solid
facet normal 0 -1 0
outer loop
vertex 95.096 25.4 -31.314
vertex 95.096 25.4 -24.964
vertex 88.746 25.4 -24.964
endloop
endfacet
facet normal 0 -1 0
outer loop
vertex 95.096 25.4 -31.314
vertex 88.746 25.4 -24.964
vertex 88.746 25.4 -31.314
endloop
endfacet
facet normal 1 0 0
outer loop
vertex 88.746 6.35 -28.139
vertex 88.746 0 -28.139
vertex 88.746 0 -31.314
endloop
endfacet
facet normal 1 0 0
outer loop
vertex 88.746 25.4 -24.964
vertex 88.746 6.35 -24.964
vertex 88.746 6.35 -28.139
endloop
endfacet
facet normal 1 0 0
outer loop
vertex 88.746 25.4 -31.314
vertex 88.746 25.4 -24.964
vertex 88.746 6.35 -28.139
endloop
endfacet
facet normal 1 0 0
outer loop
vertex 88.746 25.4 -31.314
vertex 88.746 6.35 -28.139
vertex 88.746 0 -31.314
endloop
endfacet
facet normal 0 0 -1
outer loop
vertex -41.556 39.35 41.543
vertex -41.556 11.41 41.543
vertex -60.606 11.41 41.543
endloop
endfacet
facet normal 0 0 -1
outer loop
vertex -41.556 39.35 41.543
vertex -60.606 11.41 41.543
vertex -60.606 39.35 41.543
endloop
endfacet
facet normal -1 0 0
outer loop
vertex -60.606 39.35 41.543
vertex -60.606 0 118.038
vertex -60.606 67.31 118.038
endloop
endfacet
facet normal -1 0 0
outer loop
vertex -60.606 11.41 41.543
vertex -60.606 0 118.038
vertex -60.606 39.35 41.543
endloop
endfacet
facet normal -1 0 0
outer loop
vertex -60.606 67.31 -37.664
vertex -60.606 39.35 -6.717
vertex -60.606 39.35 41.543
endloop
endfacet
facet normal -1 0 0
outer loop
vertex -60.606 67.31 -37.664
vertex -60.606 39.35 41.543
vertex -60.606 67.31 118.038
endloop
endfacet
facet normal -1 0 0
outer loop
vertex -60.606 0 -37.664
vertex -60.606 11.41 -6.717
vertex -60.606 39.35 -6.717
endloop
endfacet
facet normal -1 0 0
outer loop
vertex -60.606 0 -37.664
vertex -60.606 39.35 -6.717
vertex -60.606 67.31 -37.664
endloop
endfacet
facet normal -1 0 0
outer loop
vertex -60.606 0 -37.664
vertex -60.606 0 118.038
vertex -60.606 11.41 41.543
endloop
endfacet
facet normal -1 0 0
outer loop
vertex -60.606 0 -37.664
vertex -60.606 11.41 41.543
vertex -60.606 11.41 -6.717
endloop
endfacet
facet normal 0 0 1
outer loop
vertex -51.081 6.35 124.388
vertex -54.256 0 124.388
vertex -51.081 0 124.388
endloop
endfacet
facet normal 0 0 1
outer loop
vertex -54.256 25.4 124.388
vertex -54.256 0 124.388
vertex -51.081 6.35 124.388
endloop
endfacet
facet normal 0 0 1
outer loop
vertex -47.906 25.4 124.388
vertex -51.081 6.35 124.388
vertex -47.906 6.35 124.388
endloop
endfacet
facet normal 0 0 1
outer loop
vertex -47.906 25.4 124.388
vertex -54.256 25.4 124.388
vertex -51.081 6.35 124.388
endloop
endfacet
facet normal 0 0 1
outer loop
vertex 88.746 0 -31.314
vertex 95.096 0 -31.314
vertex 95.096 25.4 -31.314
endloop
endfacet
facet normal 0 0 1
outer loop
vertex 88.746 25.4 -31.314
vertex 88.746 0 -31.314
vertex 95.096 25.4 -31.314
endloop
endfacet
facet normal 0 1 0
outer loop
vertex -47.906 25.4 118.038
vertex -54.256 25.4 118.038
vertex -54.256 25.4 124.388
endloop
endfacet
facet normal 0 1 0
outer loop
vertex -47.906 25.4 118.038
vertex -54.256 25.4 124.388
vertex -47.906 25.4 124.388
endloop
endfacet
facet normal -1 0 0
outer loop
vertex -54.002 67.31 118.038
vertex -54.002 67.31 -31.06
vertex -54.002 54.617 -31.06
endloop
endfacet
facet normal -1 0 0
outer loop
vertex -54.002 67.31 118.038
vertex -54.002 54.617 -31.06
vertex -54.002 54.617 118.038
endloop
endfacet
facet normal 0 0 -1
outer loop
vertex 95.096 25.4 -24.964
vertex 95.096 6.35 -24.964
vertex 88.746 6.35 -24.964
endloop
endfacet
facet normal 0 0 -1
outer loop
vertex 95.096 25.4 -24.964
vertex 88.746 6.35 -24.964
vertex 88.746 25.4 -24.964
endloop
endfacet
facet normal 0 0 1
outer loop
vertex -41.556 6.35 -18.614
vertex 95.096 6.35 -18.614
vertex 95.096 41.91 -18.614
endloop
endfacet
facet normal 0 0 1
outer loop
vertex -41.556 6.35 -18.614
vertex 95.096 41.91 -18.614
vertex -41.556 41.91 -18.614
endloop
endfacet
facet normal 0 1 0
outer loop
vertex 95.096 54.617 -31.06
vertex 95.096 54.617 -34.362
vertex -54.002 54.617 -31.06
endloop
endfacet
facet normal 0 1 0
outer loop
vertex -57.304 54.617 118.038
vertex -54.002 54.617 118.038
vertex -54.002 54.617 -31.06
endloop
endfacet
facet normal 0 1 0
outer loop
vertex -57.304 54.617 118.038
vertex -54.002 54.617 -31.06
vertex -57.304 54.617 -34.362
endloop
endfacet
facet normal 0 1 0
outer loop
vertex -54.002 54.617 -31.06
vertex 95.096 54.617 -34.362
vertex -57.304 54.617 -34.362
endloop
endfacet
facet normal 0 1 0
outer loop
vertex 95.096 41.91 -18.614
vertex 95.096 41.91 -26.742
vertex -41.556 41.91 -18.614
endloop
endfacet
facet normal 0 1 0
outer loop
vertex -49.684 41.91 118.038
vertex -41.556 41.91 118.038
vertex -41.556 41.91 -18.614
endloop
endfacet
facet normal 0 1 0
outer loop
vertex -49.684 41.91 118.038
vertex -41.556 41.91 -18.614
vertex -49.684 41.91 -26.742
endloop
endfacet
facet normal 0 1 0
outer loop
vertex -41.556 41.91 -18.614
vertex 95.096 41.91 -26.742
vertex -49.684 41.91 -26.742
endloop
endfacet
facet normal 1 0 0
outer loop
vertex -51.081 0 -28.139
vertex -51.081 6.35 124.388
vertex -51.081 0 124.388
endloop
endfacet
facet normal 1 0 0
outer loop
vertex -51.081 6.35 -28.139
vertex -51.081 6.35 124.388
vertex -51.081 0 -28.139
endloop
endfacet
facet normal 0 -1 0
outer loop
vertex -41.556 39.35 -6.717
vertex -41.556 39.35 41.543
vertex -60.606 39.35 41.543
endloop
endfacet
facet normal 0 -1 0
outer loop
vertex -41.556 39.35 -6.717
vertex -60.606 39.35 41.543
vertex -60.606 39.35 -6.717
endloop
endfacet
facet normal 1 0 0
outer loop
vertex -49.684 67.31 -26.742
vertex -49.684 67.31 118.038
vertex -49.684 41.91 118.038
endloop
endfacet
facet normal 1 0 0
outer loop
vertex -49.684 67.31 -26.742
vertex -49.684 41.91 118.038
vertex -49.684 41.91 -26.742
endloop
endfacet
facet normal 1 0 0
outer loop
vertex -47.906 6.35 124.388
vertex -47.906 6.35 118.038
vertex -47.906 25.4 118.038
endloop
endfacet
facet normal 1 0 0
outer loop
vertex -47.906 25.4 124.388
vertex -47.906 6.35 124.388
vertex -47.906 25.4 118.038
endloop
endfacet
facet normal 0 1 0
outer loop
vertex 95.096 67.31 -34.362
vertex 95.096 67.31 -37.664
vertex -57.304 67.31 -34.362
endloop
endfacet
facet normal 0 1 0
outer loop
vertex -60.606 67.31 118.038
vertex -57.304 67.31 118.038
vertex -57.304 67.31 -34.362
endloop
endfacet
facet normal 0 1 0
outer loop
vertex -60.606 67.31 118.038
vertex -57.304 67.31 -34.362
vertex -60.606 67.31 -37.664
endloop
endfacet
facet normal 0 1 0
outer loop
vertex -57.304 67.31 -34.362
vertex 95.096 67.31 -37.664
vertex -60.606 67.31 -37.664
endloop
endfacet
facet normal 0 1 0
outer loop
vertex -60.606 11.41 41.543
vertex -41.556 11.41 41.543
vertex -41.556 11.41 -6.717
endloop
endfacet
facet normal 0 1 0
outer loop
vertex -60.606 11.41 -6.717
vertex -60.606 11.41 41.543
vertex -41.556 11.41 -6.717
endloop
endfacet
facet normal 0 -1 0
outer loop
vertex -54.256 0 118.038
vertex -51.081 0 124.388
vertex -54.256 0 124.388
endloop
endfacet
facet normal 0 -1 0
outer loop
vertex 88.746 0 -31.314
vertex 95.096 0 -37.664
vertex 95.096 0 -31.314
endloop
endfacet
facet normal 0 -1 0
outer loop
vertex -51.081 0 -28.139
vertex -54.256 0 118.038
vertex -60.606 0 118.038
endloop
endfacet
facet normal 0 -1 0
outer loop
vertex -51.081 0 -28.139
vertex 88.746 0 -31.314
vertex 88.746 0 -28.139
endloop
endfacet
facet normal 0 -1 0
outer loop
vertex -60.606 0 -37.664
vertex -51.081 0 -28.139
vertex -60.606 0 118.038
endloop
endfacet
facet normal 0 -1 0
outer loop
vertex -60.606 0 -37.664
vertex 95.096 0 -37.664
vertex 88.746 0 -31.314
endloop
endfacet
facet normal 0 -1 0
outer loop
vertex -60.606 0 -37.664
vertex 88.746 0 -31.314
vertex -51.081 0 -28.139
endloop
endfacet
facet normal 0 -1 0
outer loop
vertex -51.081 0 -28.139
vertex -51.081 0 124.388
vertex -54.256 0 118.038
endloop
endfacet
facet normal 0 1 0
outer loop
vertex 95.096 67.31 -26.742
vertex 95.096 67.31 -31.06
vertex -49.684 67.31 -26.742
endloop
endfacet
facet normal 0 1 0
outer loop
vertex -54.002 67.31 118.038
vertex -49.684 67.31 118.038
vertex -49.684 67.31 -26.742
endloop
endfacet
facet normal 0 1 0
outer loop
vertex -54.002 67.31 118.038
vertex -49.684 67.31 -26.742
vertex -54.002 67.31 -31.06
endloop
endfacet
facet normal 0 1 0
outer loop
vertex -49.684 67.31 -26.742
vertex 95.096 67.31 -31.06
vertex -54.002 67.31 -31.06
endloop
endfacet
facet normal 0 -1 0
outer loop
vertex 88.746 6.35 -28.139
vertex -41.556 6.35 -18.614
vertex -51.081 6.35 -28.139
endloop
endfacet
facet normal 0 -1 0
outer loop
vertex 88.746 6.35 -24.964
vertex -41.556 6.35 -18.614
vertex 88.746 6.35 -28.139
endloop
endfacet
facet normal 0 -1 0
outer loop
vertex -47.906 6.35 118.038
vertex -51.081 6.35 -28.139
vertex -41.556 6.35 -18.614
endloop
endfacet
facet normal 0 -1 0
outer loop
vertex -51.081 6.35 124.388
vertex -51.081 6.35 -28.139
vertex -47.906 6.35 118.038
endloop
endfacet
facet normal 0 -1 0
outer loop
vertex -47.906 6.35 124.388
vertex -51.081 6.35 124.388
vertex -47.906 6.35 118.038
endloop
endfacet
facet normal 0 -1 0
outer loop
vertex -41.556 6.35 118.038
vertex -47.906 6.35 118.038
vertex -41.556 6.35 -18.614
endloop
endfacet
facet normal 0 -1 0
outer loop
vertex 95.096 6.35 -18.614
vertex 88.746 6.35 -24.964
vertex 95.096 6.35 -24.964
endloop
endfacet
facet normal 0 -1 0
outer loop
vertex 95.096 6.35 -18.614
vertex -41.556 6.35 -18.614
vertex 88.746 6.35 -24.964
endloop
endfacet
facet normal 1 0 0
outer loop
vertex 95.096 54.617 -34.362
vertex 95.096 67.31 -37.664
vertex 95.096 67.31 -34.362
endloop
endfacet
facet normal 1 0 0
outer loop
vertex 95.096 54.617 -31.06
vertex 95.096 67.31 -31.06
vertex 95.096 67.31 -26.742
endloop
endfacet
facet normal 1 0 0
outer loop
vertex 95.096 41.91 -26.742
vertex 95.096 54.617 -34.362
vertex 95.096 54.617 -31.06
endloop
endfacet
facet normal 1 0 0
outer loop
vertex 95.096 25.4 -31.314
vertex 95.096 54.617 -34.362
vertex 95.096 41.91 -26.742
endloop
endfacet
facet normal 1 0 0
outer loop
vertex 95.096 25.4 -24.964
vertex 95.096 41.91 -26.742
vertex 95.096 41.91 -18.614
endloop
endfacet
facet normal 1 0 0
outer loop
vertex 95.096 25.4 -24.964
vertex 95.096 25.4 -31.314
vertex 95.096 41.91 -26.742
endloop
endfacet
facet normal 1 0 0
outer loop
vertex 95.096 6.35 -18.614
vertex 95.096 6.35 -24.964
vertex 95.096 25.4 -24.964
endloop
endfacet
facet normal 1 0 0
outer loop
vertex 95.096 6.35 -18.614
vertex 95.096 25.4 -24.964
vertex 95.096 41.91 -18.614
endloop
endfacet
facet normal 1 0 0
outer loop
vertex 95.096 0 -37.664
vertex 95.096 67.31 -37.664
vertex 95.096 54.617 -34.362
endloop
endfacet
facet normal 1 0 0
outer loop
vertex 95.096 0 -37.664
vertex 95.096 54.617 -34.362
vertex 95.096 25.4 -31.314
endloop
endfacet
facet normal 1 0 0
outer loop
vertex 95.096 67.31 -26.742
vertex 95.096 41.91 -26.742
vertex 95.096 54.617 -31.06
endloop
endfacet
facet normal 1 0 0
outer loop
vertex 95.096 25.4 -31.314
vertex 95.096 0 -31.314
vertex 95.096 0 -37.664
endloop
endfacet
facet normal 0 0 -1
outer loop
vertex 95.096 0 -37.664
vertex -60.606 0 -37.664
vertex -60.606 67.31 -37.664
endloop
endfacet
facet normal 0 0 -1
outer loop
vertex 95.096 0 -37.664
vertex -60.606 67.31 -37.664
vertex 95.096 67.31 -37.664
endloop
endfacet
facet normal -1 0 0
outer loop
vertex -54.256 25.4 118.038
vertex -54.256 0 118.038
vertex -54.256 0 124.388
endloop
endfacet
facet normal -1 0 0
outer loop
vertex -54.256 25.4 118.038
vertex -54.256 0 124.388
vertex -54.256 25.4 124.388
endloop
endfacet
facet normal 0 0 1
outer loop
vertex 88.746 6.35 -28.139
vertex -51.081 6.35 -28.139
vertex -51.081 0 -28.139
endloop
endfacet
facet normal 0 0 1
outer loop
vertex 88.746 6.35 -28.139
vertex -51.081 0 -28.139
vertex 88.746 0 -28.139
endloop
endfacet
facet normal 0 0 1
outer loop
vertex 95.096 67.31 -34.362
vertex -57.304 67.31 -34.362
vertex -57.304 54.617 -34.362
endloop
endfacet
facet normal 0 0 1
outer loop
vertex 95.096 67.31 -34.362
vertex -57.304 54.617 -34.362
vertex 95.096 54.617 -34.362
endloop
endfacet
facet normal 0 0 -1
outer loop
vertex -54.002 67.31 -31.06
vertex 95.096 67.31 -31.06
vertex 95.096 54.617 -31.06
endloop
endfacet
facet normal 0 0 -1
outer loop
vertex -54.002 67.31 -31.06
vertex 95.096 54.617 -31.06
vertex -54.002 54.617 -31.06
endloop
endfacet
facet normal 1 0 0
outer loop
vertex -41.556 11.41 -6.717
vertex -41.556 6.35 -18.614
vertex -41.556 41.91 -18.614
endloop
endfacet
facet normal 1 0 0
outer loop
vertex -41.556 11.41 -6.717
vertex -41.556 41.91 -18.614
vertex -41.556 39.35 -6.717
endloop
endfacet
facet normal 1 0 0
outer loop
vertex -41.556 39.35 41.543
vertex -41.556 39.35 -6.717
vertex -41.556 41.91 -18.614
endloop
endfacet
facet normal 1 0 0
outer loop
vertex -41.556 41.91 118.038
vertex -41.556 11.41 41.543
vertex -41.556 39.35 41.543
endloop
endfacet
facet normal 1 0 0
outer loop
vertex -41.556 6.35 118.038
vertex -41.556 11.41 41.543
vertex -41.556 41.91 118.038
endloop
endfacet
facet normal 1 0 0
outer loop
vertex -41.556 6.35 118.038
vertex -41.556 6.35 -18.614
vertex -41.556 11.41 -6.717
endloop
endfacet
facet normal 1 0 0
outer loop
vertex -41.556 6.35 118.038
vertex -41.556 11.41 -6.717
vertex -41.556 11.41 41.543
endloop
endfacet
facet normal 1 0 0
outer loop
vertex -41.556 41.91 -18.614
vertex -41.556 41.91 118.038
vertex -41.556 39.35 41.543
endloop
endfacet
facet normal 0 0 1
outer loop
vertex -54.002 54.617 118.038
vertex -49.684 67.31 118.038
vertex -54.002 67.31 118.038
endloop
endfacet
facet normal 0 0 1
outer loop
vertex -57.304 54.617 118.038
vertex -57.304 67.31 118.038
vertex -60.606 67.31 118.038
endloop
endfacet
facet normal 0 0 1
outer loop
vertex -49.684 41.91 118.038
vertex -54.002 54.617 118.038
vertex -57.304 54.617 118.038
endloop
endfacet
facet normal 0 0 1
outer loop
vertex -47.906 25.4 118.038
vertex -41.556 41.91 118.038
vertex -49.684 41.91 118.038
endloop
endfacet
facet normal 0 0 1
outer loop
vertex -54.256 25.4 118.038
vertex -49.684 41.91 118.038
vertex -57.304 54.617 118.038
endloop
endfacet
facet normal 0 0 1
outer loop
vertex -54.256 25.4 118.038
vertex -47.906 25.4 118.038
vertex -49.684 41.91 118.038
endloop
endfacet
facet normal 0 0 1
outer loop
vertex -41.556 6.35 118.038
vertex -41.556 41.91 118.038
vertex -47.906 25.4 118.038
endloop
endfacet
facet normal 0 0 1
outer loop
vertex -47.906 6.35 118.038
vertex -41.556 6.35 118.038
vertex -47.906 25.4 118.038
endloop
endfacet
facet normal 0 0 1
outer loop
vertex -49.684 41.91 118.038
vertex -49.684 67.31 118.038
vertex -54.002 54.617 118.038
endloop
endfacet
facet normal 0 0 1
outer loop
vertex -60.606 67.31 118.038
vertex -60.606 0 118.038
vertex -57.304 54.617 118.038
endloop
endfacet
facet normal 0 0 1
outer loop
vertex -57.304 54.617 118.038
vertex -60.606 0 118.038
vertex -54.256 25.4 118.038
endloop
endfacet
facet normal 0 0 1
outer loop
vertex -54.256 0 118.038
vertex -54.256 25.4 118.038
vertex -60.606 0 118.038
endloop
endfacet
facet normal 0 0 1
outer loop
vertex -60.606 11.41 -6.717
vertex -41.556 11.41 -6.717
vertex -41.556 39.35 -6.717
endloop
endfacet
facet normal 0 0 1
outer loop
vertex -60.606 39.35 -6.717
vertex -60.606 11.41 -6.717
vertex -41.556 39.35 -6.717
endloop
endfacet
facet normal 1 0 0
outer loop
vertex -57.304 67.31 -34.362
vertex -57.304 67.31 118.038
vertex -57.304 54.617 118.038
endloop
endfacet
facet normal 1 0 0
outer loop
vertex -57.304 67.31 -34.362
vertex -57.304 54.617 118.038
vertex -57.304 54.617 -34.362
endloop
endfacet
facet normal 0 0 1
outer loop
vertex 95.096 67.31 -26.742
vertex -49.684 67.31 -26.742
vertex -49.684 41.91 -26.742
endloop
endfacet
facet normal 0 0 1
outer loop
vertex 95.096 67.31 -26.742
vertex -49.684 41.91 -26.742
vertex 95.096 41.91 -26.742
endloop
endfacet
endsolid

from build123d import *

# Parameters (mm, degrees)
BOSS_EXTRUDE5_DEPTH     = 67.31
CUT_EXTRUDE2_DEPTH      = 12.693340834
CUT_EXTRUDE3_DEPTH      = 25.4
SKETCH11_W              = 6.35
SKETCH11_H              = 25.4
BOSS_EXTRUDE6_DEPTH     = 6.35
SKETCH12_W              = 6.35
SKETCH12_H              = 25.4
CUT_EXTRUDE4_DEPTH      = 6.35
CUT_EXTRUDE5_DEPTH      = 171.430214526
CUT_EXTRUDE5_DEPTH_BACK = 6.35
SKETCH15_W              = 48.26
SKETCH15_H              = 27.94
CUT_EXTRUDE6_DEPTH      = 45.212


with BuildPart() as part:
    # Sketch1 → Boss-Extrude5 (new body)
    with BuildSketch(Plane(origin=(0, 0, 0), x_dir=(1, 0, 0), z_dir=(0, 1, 0))):
        Polygon((-60.605605599, 37.663504972), (95.096394401, 37.663504972), (95.096394401, 18.613504972), (-41.555605599, 18.613504972), (-41.555605599, -118.038495028), (-60.605605599, -118.038495028), align=None)
    extrude(amount=BOSS_EXTRUDE5_DEPTH)

    # Sketch8 → Cut-Extrude2 (cut)
    with BuildSketch(Plane(origin=(0, 67.31, 0), x_dir=(1, 0, 0), z_dir=(0, 1, 0))):
        Polygon((-57.303605599, -118.038495028), (-57.303605599, 34.361504972), (95.096394401, 34.361504972), (95.096394401, 31.059504972), (-54.001605599, 31.059504972), (-54.001605599, -118.038495028), align=None)
    extrude(amount=-CUT_EXTRUDE2_DEPTH, mode=Mode.SUBTRACT)

    # Sketch9 → Cut-Extrude3 (cut)
    with BuildSketch(Plane(origin=(0, 67.31, 0), x_dir=(1, 0, 0), z_dir=(0, 1, 0))):
        Polygon((-49.683605599, -118.038495028), (-49.683605599, 26.741504972), (95.096394401, 26.741504972), (95.096394401, 18.613504972), (-41.555605599, 18.613504972), (-41.555605599, -118.038495028), align=None)
    extrude(amount=-CUT_EXTRUDE3_DEPTH, mode=Mode.SUBTRACT)

    # Sketch11 → Boss-Extrude6 (add)
    with BuildSketch(Plane.XY.offset(118.038495028)):
        with Locations((-51.080605599, 12.7)):
            Rectangle(SKETCH11_W, SKETCH11_H)
    extrude(amount=BOSS_EXTRUDE6_DEPTH)

    # Sketch12 → Cut-Extrude4 (cut)
    with BuildSketch(Plane(origin=(95.096394401, 0, 0), x_dir=(0, 0, -1), z_dir=(1, 0, 0))):
        with Locations((28.138504972, 12.7)):
            Rectangle(SKETCH12_W, SKETCH12_H)
    extrude(amount=-CUT_EXTRUDE4_DEPTH, mode=Mode.SUBTRACT)

    # Sketch13 → Cut-Extrude5 (cut, two sides: drawn at the far end of the back side and taken through both)
    with BuildSketch(Plane.XZ.offset(-CUT_EXTRUDE5_DEPTH_BACK)):
        Polygon((-51.080605599, 570.867892173), (-51.080605599, 124.388495028), (-51.080605599, -25.399651713), (-51.080605599, -28.138504972), (88.746394401, -28.138504972), (535.225791546, -28.138504972), (1173.371683532, 596.477560176), (587.065286387, 1195.483957321), align=None)
    extrude(amount=CUT_EXTRUDE5_DEPTH + CUT_EXTRUDE5_DEPTH_BACK, mode=Mode.SUBTRACT)

    # Sketch15 → Cut-Extrude6 (cut)
    with BuildSketch(Plane(origin=(-41.555605599, 0, 0), x_dir=(0, 0, -1), z_dir=(1, 0, 0))):
        with Locations((-17.412502411, 25.379779706)):
            Rectangle(SKETCH15_W, SKETCH15_H)
    extrude(amount=-CUT_EXTRUDE6_DEPTH, mode=Mode.SUBTRACT)


solid = part.part
